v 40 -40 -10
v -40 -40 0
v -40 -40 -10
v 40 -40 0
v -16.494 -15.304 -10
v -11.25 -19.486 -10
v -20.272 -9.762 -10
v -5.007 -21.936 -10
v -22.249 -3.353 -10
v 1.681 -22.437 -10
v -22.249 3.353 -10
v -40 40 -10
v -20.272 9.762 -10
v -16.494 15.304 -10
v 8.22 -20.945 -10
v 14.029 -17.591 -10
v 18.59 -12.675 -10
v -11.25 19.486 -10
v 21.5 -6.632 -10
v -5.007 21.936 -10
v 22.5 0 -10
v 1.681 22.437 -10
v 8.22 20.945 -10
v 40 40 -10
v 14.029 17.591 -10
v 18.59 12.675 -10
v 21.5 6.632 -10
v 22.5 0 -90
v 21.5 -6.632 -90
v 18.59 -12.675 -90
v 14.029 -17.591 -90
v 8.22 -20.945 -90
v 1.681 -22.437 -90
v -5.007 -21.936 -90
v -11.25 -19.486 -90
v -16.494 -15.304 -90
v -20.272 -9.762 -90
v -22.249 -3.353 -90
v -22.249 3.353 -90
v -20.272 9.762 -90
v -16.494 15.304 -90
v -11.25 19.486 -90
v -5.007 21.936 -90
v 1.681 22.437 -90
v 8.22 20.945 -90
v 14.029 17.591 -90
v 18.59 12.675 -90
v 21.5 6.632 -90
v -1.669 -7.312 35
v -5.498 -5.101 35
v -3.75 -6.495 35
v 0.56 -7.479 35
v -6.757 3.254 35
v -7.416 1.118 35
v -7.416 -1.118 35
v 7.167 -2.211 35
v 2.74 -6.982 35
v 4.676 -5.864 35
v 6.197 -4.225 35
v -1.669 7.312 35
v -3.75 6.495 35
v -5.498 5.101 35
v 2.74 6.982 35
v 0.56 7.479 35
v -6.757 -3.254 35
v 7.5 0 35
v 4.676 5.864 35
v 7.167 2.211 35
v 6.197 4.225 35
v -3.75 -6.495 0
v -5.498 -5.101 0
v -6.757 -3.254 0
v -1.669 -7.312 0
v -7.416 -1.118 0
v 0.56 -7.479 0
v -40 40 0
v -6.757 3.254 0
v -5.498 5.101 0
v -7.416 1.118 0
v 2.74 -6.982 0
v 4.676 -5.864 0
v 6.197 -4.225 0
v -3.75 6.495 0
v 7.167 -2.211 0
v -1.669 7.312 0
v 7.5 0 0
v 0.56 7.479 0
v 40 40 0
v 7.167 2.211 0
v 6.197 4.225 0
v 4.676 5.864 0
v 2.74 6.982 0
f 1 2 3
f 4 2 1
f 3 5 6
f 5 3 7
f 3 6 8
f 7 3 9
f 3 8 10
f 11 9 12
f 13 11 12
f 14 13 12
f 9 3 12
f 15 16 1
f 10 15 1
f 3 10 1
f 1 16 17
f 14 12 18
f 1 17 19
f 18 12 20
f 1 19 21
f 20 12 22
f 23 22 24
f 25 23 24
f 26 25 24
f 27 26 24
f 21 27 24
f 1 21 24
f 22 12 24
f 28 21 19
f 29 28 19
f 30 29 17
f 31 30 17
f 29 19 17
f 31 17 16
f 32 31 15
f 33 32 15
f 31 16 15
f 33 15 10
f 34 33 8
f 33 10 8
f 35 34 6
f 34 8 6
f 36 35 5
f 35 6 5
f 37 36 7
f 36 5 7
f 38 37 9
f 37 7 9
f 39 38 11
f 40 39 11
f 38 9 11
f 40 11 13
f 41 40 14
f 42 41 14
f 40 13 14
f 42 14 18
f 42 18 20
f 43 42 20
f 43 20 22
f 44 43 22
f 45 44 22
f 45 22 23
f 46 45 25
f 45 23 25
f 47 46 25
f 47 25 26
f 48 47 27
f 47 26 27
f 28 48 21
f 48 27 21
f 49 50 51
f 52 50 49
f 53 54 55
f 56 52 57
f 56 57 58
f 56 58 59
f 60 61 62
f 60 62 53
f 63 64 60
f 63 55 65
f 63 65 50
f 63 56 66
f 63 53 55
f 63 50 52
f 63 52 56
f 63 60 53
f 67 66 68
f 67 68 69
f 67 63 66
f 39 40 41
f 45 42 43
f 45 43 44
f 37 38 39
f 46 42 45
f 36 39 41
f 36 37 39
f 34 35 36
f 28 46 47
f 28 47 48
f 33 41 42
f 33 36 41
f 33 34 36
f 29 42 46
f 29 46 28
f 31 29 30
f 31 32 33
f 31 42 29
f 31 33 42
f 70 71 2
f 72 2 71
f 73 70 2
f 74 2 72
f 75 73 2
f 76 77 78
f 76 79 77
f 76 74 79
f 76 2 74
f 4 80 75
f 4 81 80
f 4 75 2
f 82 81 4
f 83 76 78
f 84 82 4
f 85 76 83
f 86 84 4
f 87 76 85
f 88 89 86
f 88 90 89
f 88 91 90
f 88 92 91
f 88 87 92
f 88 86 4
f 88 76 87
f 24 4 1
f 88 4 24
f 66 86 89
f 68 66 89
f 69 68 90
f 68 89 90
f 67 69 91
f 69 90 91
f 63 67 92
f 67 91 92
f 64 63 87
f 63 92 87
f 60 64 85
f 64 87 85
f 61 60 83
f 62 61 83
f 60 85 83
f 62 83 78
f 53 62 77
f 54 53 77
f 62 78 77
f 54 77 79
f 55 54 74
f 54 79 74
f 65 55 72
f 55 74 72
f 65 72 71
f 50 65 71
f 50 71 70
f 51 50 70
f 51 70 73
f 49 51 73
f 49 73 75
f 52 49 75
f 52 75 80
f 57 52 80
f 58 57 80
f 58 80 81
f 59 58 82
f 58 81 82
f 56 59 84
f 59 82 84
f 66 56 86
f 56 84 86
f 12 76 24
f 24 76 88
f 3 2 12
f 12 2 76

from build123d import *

# Parameters (mm, degrees)
F0_W     = 80
F0_H     = 80
F1_DEPTH = 10
F2_R     = 22.5
F3_DEPTH = 80
F4_R     = 7.5
F5_DEPTH = 35


with BuildPart() as f1:
    # F0 (on Top) → F1 (new body)
    with BuildSketch(Plane.XY):
        Rectangle(F0_W, F0_H)
    extrude(amount=-F1_DEPTH)

    # F2 (on face) → F3 (join)
    with BuildSketch(Plane(origin=(0, 0, -10), x_dir=(1, 0, 0), z_dir=(0, 0, -1))):
        Circle(F2_R)
    extrude(amount=F3_DEPTH)

    # F4 (on face) → F5 (join)
    with BuildSketch(Plane.XY):
        Circle(F4_R)
    extrude(amount=F5_DEPTH)


solid = f1.part
